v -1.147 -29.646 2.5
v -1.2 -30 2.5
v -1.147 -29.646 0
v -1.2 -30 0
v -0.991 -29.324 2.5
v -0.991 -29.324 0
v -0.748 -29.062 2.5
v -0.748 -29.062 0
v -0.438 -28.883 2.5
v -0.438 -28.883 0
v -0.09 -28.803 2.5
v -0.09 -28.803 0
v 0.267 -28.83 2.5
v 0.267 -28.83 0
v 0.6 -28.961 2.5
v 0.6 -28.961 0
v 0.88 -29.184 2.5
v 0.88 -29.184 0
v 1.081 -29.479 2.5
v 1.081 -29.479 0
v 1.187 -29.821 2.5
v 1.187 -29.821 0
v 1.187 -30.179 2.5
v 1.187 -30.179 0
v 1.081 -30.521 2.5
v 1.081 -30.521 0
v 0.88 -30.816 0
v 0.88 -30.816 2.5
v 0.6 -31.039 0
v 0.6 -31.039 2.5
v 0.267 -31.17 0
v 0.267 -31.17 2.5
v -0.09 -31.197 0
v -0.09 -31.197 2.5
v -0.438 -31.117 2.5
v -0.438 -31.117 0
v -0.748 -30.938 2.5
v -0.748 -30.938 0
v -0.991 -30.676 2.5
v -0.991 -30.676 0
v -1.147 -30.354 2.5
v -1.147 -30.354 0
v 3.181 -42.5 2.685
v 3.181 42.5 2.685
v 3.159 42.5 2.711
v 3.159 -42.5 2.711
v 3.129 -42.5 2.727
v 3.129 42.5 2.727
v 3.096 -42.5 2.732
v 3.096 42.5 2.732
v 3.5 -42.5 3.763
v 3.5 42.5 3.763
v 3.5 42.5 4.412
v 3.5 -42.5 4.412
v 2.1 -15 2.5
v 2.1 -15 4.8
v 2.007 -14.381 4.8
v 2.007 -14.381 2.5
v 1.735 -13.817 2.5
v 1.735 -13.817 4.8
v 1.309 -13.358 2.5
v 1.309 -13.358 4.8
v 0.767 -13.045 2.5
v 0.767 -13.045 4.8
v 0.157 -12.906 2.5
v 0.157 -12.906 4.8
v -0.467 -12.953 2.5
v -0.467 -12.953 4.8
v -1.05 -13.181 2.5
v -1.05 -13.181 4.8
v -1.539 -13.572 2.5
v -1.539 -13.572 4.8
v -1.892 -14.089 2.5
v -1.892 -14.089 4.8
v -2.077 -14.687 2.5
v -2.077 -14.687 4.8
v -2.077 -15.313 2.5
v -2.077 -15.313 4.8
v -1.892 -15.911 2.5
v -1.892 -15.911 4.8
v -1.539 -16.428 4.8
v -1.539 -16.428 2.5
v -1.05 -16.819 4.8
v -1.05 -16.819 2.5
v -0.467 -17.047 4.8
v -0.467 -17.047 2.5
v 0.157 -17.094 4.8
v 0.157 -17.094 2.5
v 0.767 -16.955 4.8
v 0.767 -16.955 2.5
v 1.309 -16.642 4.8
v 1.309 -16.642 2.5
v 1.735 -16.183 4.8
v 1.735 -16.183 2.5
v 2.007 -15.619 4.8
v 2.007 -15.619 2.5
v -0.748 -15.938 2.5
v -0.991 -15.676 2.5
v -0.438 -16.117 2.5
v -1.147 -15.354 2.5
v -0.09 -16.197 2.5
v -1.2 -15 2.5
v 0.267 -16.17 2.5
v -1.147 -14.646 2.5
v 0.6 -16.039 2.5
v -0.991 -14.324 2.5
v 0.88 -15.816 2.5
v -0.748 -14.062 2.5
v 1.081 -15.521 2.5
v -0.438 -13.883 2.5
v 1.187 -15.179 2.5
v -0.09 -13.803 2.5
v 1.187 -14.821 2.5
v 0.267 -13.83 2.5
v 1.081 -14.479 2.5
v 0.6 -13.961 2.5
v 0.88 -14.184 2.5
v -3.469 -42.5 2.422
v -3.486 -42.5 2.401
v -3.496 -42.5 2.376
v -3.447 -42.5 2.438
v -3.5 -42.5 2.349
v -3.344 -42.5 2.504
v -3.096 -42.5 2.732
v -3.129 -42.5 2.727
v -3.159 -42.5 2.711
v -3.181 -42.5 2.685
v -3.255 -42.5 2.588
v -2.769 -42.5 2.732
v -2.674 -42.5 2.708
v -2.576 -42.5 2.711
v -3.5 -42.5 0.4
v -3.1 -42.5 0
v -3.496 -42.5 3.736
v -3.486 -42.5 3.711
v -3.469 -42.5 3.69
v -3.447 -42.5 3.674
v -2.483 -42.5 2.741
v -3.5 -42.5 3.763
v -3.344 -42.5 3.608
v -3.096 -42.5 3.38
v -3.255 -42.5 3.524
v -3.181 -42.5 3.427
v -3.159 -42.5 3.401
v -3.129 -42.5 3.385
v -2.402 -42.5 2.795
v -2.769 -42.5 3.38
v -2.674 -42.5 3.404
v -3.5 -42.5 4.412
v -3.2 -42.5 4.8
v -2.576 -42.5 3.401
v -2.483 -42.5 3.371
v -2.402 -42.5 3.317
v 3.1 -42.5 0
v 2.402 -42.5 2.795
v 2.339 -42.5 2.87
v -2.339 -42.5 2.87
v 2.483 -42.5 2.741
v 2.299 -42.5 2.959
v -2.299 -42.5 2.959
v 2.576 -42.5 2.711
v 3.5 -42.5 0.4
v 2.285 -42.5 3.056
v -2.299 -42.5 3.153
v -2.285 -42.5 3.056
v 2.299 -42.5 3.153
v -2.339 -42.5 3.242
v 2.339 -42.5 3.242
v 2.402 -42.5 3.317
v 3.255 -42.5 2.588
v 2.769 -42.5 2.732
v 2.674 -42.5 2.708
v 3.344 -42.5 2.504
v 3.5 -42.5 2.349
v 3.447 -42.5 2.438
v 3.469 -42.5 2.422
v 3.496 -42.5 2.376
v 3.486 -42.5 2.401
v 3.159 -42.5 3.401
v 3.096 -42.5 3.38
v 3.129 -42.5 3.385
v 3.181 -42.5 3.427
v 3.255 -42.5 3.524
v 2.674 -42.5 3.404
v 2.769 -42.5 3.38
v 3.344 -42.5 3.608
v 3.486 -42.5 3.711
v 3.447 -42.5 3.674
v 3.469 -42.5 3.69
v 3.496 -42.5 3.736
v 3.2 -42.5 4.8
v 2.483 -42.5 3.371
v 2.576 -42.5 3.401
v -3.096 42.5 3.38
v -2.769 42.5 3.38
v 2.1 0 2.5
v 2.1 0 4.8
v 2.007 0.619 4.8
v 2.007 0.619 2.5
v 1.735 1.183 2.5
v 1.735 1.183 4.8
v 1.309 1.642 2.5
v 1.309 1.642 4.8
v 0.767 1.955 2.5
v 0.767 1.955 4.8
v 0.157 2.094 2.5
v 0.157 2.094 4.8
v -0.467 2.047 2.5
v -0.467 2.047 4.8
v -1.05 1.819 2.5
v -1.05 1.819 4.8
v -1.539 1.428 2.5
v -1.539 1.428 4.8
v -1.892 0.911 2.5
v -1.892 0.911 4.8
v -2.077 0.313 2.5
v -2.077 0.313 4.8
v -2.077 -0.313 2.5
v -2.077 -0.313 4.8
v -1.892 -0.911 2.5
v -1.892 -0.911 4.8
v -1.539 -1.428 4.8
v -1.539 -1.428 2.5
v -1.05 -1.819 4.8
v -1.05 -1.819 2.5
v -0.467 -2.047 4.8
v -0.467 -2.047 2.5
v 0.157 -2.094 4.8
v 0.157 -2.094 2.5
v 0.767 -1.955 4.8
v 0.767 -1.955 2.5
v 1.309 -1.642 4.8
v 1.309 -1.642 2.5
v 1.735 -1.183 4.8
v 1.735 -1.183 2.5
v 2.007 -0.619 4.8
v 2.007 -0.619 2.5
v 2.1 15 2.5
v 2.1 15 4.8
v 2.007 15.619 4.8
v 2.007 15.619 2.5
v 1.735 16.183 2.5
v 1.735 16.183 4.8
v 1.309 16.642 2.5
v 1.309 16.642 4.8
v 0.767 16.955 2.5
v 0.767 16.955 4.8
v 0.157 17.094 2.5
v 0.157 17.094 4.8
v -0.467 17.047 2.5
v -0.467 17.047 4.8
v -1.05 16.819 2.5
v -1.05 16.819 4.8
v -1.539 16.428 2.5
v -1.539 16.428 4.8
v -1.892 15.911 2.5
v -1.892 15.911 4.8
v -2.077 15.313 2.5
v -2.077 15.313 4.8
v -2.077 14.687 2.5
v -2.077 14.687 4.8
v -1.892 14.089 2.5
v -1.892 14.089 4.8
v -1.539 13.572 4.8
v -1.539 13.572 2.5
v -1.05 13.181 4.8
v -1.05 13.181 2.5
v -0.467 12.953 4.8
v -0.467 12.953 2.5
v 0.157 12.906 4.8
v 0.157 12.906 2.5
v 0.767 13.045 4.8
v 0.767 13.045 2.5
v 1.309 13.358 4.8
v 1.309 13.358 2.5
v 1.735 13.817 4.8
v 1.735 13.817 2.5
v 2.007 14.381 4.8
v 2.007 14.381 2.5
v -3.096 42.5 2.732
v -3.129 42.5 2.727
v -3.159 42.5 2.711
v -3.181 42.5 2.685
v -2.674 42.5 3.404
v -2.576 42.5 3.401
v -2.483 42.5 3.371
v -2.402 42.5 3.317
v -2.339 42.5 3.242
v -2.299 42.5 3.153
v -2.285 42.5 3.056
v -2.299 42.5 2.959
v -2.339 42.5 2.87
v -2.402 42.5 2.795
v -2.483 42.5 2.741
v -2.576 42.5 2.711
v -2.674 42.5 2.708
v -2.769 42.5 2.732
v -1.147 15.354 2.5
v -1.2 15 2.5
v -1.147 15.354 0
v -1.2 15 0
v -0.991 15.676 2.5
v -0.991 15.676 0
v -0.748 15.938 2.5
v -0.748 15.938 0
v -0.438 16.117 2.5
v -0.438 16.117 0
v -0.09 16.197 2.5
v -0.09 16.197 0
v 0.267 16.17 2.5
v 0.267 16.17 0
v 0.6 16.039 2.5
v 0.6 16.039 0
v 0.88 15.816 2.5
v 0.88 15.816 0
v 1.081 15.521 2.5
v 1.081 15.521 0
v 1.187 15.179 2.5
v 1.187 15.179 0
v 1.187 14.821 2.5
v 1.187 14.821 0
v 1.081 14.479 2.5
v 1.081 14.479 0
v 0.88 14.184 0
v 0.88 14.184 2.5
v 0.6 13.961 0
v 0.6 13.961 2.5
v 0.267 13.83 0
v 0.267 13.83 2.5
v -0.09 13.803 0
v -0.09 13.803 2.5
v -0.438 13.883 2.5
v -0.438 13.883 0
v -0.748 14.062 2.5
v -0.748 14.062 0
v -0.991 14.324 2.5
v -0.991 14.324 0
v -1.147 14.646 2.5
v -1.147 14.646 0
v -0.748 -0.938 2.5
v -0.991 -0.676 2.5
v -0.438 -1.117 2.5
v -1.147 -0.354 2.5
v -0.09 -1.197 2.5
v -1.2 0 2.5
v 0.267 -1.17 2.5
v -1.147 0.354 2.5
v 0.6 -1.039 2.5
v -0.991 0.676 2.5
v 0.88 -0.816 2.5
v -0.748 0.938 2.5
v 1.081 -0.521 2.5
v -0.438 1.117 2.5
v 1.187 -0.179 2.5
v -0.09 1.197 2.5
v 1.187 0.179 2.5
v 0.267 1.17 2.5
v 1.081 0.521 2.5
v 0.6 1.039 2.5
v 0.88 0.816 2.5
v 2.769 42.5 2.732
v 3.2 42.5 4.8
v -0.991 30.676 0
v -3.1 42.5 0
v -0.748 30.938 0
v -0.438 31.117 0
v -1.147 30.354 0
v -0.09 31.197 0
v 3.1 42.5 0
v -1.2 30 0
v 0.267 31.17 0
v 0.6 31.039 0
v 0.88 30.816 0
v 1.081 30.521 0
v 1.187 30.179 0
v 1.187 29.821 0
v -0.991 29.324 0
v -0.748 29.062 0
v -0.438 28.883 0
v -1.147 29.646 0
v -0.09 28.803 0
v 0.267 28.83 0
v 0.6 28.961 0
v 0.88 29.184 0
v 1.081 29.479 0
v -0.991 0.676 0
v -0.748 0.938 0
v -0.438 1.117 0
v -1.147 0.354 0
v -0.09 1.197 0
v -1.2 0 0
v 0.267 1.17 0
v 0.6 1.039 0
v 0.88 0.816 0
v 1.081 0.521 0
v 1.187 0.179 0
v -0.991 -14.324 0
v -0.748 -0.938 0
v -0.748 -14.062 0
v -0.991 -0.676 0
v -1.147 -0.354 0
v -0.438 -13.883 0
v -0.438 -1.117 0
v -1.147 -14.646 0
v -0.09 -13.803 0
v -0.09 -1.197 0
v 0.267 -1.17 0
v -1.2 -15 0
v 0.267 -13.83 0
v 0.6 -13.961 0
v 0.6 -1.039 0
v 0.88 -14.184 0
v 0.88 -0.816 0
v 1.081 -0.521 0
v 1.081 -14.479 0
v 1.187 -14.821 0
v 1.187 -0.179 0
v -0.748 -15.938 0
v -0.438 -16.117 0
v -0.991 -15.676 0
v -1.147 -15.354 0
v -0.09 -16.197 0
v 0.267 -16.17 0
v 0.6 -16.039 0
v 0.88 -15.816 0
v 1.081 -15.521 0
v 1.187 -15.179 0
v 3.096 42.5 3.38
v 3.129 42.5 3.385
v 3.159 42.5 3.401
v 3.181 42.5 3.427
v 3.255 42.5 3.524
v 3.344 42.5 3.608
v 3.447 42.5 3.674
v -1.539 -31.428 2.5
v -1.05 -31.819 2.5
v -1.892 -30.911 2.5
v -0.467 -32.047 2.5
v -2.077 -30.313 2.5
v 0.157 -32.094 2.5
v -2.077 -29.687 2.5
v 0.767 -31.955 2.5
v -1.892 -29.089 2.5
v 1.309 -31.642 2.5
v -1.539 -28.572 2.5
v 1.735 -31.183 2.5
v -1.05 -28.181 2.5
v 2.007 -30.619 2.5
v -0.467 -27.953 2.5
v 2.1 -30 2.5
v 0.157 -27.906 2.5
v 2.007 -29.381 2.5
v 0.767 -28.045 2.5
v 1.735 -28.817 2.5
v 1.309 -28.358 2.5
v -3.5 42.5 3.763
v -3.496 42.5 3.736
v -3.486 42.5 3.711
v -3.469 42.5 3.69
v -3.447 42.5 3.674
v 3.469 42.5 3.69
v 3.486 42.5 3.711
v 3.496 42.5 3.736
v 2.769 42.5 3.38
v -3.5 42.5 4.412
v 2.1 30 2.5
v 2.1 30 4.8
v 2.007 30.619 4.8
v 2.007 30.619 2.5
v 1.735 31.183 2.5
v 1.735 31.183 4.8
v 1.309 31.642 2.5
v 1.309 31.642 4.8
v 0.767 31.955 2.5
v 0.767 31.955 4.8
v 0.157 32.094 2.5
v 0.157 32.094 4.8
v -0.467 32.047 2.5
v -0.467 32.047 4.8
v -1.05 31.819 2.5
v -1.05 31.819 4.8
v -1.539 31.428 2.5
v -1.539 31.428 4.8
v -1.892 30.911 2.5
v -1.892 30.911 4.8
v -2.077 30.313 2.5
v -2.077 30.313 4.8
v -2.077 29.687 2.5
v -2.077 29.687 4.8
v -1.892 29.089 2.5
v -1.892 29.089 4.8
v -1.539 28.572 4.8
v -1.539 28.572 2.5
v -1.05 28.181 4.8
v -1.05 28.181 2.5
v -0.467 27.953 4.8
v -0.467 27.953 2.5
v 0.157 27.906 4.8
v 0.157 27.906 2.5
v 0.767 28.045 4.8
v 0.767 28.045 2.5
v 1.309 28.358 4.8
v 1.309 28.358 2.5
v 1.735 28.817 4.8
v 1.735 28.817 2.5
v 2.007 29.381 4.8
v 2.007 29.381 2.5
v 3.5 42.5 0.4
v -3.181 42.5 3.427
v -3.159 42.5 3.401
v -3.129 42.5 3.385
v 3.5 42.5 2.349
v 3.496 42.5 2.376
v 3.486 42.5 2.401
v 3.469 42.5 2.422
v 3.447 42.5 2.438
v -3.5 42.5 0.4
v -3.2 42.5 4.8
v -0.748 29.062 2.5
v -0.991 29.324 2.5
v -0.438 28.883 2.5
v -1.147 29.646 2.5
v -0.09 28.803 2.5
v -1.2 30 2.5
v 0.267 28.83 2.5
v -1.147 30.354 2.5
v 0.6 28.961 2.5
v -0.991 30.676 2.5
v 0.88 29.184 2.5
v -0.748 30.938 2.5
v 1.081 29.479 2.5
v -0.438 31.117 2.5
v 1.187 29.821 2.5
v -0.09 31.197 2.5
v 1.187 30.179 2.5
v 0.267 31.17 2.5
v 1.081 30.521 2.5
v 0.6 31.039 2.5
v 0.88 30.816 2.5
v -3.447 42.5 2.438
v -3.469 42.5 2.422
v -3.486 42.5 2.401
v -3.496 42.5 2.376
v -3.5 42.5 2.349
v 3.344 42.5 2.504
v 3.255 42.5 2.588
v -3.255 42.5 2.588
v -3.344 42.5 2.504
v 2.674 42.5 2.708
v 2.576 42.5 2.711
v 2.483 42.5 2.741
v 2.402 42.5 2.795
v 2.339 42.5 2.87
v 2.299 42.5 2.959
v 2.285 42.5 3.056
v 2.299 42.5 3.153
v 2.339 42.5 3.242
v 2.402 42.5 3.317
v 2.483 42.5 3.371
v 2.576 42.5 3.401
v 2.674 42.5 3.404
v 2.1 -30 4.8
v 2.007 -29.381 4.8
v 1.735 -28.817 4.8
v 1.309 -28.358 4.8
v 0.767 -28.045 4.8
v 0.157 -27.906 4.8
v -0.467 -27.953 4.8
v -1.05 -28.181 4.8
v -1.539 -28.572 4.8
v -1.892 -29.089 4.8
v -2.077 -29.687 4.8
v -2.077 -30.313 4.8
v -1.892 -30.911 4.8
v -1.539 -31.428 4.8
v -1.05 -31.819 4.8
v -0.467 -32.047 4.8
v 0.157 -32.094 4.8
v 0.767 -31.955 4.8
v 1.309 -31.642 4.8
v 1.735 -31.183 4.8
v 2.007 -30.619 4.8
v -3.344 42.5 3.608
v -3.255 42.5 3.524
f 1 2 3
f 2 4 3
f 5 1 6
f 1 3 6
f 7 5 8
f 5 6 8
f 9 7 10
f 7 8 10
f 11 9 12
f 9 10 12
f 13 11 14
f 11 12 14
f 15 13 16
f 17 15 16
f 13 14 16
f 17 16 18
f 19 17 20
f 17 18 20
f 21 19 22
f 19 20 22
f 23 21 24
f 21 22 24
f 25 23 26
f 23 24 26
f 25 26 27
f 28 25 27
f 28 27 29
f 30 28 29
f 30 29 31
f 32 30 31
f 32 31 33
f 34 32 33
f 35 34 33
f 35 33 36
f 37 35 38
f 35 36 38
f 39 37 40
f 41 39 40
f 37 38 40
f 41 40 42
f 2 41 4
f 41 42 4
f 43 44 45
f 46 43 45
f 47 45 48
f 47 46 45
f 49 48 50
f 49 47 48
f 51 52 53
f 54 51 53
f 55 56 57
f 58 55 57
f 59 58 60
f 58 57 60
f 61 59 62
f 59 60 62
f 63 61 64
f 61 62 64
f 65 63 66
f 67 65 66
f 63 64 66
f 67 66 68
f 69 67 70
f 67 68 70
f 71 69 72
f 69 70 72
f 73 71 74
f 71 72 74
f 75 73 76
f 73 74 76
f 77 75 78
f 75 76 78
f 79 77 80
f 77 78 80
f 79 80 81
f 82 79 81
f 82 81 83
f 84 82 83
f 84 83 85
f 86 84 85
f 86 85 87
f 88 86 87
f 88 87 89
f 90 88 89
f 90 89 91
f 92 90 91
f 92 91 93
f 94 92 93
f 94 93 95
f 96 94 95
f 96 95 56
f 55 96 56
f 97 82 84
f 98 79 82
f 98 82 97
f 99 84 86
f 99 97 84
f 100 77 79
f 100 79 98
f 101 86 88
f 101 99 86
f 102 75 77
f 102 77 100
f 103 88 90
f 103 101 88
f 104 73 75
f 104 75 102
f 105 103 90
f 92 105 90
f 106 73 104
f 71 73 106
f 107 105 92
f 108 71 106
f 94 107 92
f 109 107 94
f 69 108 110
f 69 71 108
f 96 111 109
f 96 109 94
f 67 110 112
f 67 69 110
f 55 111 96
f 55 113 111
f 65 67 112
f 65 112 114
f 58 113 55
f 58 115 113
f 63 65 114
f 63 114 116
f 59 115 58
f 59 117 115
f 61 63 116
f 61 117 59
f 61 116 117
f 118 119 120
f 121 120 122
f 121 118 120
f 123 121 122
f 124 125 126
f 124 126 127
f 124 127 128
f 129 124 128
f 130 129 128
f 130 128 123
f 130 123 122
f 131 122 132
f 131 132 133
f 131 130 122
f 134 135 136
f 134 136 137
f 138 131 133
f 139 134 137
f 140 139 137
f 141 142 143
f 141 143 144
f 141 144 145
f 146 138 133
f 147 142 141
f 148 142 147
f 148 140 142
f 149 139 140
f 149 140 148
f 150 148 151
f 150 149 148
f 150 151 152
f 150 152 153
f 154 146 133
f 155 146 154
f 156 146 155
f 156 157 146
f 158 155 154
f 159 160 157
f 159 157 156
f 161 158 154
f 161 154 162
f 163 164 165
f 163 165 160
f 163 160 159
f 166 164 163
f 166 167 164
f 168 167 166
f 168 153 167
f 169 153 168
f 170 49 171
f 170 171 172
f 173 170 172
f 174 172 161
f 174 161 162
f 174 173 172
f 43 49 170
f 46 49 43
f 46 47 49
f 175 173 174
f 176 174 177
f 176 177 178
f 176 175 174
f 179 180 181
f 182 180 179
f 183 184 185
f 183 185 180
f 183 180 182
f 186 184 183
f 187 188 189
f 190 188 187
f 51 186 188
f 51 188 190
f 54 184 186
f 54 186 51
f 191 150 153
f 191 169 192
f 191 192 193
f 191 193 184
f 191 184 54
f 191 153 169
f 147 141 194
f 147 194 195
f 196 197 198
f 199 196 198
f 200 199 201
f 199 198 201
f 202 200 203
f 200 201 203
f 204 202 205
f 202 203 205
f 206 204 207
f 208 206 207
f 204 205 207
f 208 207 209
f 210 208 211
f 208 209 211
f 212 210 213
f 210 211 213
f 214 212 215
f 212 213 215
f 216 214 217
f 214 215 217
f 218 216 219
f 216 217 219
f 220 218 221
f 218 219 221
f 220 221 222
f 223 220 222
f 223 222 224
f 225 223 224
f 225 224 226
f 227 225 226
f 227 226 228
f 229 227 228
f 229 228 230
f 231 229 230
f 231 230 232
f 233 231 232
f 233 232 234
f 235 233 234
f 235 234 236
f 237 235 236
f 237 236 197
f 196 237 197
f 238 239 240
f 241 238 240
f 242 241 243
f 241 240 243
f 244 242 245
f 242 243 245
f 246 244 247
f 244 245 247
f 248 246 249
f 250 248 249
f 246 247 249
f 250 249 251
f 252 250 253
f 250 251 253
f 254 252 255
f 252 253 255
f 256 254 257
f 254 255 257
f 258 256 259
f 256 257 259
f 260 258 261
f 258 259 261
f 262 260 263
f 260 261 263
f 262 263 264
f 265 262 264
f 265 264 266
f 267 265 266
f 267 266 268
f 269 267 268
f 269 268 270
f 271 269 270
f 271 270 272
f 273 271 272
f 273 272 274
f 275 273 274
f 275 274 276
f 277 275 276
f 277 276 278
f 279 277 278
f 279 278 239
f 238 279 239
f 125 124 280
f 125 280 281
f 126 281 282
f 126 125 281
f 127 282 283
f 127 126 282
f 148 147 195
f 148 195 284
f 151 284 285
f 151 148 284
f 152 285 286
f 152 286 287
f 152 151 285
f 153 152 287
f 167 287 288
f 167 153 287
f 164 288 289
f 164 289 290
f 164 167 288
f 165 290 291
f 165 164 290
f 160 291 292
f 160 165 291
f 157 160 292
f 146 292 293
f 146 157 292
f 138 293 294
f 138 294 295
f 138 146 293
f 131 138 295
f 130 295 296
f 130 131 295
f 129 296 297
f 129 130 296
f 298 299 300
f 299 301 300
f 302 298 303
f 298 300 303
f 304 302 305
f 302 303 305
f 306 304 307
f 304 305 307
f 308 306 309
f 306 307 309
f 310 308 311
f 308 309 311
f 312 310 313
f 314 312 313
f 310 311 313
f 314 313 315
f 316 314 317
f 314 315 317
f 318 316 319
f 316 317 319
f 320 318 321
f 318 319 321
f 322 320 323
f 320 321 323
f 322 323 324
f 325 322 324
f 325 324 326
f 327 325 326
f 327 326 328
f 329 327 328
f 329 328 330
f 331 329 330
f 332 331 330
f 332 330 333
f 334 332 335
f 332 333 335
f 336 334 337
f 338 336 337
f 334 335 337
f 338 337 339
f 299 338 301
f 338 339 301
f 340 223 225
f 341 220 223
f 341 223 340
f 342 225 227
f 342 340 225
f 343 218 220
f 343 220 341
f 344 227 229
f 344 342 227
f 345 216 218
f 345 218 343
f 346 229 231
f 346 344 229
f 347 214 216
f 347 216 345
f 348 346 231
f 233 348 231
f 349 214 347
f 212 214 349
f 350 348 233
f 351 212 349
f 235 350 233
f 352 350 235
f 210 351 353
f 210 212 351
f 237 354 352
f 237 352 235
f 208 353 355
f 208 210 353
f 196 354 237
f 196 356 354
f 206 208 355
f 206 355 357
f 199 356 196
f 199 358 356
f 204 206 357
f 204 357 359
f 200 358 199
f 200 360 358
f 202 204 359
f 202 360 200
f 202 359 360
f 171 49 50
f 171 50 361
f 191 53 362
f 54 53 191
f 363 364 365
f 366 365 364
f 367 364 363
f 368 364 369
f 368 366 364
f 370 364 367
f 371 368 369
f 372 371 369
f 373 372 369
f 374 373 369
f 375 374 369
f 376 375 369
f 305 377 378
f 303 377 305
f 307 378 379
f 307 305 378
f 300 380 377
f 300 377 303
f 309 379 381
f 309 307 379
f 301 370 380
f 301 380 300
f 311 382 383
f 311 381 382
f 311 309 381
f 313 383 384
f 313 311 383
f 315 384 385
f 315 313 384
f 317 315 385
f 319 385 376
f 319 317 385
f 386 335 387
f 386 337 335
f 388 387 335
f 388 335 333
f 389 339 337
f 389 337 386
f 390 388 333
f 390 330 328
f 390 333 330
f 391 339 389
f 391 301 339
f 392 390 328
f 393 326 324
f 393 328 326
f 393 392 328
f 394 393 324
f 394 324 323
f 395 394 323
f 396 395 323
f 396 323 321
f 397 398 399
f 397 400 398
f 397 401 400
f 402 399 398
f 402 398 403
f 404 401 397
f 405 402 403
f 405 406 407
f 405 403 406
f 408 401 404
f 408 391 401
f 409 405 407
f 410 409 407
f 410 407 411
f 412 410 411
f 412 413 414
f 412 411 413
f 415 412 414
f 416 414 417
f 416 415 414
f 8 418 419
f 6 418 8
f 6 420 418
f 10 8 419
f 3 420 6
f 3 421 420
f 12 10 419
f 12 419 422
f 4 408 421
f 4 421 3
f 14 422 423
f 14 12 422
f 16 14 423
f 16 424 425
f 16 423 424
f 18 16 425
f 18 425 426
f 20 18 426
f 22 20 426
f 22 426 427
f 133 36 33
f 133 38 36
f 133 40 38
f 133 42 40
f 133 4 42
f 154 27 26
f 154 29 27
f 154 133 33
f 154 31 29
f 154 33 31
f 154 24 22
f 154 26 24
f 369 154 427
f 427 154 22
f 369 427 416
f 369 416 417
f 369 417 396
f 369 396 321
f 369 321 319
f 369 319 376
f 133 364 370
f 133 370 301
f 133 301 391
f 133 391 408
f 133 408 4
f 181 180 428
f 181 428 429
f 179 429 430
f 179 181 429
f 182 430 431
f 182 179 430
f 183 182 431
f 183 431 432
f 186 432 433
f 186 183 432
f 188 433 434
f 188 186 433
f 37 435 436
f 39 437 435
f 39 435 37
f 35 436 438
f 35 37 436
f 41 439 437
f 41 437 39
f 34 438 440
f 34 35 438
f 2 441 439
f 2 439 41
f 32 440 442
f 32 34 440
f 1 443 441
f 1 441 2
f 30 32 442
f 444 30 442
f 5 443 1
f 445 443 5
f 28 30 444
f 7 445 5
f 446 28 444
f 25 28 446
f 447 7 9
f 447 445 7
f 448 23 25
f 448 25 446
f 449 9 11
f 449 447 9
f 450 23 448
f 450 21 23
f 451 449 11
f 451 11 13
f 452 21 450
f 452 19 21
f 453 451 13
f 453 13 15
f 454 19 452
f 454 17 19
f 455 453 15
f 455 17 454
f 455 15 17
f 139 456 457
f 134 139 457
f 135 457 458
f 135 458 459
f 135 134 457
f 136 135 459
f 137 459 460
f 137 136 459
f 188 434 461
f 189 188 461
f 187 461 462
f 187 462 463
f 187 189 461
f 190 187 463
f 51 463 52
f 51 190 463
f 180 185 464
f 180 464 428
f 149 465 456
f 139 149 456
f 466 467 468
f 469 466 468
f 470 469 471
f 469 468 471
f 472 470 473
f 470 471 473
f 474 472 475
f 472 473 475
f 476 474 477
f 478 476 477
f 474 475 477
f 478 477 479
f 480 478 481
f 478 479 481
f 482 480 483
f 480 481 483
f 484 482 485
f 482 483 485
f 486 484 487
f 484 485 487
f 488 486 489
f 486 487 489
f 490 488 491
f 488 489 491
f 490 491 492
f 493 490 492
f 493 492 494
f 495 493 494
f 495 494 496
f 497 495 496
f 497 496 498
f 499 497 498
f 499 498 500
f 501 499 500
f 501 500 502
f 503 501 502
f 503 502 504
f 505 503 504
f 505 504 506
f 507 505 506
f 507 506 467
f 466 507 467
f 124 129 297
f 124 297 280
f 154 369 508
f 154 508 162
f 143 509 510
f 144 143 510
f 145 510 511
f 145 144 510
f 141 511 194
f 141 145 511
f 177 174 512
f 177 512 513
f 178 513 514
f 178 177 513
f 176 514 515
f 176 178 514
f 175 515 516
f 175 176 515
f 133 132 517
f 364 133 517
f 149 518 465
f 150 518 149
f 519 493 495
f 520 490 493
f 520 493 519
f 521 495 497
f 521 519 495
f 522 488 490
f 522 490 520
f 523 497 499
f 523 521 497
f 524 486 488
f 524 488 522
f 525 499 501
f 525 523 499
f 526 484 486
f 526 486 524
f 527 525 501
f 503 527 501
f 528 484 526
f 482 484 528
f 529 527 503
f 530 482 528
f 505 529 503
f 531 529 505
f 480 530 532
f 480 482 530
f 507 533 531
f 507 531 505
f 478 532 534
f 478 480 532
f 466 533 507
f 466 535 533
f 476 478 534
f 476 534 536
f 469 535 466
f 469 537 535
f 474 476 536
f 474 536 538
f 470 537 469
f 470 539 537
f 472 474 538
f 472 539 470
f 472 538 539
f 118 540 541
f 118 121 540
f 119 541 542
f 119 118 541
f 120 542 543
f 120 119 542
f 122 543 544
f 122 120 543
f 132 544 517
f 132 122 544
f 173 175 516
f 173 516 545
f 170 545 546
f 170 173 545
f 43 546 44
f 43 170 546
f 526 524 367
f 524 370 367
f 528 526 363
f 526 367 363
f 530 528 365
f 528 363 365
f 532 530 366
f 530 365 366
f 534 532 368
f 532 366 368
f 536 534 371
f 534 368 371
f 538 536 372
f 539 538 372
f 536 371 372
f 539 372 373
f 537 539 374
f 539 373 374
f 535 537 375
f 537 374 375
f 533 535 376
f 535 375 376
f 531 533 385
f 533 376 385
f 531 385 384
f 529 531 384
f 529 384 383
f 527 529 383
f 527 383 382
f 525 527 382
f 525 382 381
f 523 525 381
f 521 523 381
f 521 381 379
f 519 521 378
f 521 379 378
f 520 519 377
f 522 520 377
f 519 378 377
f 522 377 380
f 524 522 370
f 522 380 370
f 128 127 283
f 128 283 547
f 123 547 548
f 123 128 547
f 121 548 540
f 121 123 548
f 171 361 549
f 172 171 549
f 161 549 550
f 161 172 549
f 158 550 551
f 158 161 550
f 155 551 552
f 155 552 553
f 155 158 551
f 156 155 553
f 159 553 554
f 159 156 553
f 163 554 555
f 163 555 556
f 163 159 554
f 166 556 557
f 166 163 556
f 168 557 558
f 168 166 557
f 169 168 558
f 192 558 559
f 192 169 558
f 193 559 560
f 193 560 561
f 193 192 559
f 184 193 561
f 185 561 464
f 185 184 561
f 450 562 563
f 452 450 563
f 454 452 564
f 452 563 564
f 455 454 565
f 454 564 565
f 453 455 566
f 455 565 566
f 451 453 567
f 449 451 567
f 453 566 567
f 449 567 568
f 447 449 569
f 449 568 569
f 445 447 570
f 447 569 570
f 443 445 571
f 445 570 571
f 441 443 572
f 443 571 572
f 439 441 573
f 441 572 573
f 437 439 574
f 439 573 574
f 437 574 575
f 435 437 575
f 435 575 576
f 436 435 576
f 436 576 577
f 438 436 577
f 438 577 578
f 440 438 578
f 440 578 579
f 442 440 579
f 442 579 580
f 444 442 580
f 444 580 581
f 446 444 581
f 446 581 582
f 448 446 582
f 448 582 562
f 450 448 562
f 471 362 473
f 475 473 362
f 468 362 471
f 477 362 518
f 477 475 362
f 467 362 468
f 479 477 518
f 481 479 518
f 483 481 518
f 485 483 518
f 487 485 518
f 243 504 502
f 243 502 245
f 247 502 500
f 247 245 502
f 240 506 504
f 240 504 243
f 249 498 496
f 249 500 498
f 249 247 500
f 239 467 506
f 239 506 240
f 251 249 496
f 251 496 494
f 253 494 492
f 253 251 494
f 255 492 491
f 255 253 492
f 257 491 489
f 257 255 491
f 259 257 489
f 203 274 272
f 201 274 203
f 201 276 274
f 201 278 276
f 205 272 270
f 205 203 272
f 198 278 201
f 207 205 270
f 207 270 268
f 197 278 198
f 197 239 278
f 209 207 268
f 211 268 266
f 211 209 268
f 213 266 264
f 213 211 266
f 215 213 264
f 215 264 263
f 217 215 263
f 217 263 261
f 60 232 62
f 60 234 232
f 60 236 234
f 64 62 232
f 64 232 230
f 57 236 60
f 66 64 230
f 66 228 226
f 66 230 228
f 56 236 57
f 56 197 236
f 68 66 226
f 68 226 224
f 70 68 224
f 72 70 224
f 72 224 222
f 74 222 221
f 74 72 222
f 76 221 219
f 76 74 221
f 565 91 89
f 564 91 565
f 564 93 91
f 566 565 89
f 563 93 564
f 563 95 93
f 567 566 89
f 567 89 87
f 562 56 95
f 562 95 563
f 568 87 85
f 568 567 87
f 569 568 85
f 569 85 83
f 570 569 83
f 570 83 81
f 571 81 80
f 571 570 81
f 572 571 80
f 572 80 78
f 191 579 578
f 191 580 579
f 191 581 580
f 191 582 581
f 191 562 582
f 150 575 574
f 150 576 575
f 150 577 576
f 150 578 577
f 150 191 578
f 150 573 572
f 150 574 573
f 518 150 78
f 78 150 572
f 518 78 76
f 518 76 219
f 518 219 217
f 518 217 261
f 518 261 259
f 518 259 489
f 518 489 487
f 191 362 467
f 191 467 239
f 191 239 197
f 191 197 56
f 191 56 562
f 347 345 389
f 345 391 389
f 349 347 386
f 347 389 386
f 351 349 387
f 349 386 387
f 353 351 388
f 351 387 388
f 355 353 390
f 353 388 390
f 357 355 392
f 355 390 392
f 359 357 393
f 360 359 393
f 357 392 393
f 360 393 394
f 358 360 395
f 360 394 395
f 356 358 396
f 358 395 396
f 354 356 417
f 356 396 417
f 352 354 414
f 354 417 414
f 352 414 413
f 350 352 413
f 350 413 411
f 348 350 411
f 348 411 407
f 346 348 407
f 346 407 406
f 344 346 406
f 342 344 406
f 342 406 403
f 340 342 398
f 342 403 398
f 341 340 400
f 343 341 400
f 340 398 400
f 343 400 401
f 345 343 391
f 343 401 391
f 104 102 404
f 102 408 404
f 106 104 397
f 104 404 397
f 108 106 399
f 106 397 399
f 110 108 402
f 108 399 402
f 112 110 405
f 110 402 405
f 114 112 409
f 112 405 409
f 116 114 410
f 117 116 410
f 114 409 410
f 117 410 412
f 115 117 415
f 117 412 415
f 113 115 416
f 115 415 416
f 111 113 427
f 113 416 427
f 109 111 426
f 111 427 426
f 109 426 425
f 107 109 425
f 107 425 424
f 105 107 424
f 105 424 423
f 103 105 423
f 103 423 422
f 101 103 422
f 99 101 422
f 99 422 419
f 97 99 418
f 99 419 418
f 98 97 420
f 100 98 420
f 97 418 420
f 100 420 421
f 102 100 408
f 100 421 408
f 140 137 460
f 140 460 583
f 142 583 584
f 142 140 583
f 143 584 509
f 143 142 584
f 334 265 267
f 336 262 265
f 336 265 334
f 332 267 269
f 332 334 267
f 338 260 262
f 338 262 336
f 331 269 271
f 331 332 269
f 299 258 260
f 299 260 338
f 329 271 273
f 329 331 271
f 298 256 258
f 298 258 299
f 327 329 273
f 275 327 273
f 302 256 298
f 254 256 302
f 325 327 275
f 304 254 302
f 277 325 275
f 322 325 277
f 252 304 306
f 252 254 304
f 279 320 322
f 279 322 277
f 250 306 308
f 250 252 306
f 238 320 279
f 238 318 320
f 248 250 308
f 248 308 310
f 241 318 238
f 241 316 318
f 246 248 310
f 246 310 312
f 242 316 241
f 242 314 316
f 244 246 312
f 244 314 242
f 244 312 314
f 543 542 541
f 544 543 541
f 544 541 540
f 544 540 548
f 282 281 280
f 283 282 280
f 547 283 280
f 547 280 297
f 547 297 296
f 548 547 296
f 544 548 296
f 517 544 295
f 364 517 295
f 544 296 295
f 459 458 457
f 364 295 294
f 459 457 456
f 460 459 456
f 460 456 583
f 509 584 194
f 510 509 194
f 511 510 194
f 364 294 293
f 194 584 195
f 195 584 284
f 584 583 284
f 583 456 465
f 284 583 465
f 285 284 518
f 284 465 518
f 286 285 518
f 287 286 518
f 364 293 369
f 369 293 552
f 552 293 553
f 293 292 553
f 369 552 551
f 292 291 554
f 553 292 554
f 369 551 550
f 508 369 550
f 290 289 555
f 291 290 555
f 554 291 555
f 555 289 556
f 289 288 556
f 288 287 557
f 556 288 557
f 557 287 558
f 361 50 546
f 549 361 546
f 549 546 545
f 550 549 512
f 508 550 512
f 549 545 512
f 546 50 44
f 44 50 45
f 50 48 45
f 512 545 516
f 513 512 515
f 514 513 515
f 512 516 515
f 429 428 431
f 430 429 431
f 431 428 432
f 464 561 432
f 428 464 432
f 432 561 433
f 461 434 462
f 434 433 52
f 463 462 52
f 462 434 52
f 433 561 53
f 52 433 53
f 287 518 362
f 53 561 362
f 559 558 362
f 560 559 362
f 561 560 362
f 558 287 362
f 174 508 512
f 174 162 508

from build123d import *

# Parameters (mm, degrees)
F1_DEPTH       = 42.5
F2_C1_SIZE2    = 0.3
F2_C1_SIZE     = 0.388
F2_C2_SIZE2    = 0.388
F2_C2_SIZE     = 0.3
F3_SIZE        = 0.4
F5_D           = 2.4
F5_CBORE_D     = 4.2
F5_CBORE_DEPTH = 2.3


with BuildPart() as f1:
    # F0 (on Front) → F1 (new body, symmetric)
    with BuildSketch(Plane.XZ):
        with BuildLine():
            Line((-3.5, 0), (3.5, 0))
            Line((3.5, 0), (3.5, 2.3493352987))
            ThreePointArc((3.5, 2.3493352987), (3.4856956825, 2.4008741191), (3.446875, 2.4376683864))
            ThreePointArc((3.446875, 2.4376683864), (3.2976460443, 2.5440105461), (3.1811284368, 2.6854375))
            ThreePointArc((3.1811284368, 2.6854375), (3.1447986618, 2.7199464122), (3.096289642, 2.7325))
            Line((3.096289642, 2.7325), (2.7685954715, 2.7325))
            ThreePointArc((2.7685954715, 2.7325), (2.285, 3.056), (2.7685954715, 3.3795))
            Line((2.7685954715, 3.3795), (3.096289642, 3.3795))
            ThreePointArc((3.096289642, 3.3795), (3.1447986618, 3.3920535878), (3.1811284368, 3.4265625))
            ThreePointArc((3.1811284368, 3.4265625), (3.2976460443, 3.5679894539), (3.446875, 3.6743316136))
            ThreePointArc((3.446875, 3.6743316136), (3.4856956825, 3.7111258809), (3.5, 3.7626647013))
            Line((3.5, 3.7626647013), (3.5, 4.8))
            Line((3.5, 4.8), (-3.5, 4.8))
            Line((-3.5, 4.8), (-3.5, 3.7626647013))
            ThreePointArc((-3.5, 3.7626647013), (-3.4856956825, 3.7111258809), (-3.446875, 3.6743316136))
            ThreePointArc((-3.446875, 3.6743316136), (-3.2976460443, 3.5679894539), (-3.1811284368, 3.4265625))
            ThreePointArc((-3.1811284368, 3.4265625), (-3.1447986618, 3.3920535878), (-3.096289642, 3.3795))
            Line((-3.096289642, 3.3795), (-2.7685954715, 3.3795))
            ThreePointArc((-2.7685954715, 3.3795), (-2.4403958056, 3.3469109959), (-2.285, 3.056))
            ThreePointArc((-2.285, 3.056), (-2.4403958056, 2.7650890041), (-2.7685954715, 2.7325))
            Line((-2.7685954715, 2.7325), (-3.096289642, 2.7325))
            ThreePointArc((-3.096289642, 2.7325), (-3.1447986618, 2.7199464122), (-3.1811284368, 2.6854375))
            ThreePointArc((-3.1811284368, 2.6854375), (-3.2976460443, 2.5440105461), (-3.446875, 2.4376683864))
            ThreePointArc((-3.446875, 2.4376683864), (-3.4856956825, 2.4008741191), (-3.5, 2.3493352987))
            Line((-3.5, 2.3493352987), (-3.5, 0))
        make_face()
    extrude(amount=F1_DEPTH, both=True)

    # F2: chamfer of 0.3 x 0.388 on 2 edges, made by hand

    # F2_c1
    f2_c1_edges = [f1.edges().sort_by_distance(p)[0] for p in [
        (-3.5, 0, 4.8),
    ]]
    f2_c1_side = f1.faces().sort_by_distance((-3.5, 0, 4.794))[0]
    chamfer(f2_c1_edges, length=F2_C1_SIZE, length2=F2_C1_SIZE2, reference=f2_c1_side)

    # F2_c2
    f2_c2_edges = [f1.edges().sort_by_distance(p)[0] for p in [
        (3.5, 0, 4.8),
    ]]
    f2_c2_side = f1.faces().sort_by_distance((3.494, 0, 4.8))[0]
    chamfer(f2_c2_edges, length=F2_C2_SIZE, length2=F2_C2_SIZE2, reference=f2_c2_side)

    # F3
    f3_edges = [f1.edges().sort_by_distance(p)[0] for p in [
        (3.5, 0, 0),
        (-3.5, 0, 0),
    ]]
    chamfer(f3_edges, length=F3_SIZE)

    # F5 (through all)
    with Locations(Plane.XY.offset(4.8)):
        with Locations((0, 30), (0, 15), (0, 0), (0, -15), (0, -30)):
            CounterBoreHole(F5_D / 2, F5_CBORE_D / 2, F5_CBORE_DEPTH)


solid = f1.part
